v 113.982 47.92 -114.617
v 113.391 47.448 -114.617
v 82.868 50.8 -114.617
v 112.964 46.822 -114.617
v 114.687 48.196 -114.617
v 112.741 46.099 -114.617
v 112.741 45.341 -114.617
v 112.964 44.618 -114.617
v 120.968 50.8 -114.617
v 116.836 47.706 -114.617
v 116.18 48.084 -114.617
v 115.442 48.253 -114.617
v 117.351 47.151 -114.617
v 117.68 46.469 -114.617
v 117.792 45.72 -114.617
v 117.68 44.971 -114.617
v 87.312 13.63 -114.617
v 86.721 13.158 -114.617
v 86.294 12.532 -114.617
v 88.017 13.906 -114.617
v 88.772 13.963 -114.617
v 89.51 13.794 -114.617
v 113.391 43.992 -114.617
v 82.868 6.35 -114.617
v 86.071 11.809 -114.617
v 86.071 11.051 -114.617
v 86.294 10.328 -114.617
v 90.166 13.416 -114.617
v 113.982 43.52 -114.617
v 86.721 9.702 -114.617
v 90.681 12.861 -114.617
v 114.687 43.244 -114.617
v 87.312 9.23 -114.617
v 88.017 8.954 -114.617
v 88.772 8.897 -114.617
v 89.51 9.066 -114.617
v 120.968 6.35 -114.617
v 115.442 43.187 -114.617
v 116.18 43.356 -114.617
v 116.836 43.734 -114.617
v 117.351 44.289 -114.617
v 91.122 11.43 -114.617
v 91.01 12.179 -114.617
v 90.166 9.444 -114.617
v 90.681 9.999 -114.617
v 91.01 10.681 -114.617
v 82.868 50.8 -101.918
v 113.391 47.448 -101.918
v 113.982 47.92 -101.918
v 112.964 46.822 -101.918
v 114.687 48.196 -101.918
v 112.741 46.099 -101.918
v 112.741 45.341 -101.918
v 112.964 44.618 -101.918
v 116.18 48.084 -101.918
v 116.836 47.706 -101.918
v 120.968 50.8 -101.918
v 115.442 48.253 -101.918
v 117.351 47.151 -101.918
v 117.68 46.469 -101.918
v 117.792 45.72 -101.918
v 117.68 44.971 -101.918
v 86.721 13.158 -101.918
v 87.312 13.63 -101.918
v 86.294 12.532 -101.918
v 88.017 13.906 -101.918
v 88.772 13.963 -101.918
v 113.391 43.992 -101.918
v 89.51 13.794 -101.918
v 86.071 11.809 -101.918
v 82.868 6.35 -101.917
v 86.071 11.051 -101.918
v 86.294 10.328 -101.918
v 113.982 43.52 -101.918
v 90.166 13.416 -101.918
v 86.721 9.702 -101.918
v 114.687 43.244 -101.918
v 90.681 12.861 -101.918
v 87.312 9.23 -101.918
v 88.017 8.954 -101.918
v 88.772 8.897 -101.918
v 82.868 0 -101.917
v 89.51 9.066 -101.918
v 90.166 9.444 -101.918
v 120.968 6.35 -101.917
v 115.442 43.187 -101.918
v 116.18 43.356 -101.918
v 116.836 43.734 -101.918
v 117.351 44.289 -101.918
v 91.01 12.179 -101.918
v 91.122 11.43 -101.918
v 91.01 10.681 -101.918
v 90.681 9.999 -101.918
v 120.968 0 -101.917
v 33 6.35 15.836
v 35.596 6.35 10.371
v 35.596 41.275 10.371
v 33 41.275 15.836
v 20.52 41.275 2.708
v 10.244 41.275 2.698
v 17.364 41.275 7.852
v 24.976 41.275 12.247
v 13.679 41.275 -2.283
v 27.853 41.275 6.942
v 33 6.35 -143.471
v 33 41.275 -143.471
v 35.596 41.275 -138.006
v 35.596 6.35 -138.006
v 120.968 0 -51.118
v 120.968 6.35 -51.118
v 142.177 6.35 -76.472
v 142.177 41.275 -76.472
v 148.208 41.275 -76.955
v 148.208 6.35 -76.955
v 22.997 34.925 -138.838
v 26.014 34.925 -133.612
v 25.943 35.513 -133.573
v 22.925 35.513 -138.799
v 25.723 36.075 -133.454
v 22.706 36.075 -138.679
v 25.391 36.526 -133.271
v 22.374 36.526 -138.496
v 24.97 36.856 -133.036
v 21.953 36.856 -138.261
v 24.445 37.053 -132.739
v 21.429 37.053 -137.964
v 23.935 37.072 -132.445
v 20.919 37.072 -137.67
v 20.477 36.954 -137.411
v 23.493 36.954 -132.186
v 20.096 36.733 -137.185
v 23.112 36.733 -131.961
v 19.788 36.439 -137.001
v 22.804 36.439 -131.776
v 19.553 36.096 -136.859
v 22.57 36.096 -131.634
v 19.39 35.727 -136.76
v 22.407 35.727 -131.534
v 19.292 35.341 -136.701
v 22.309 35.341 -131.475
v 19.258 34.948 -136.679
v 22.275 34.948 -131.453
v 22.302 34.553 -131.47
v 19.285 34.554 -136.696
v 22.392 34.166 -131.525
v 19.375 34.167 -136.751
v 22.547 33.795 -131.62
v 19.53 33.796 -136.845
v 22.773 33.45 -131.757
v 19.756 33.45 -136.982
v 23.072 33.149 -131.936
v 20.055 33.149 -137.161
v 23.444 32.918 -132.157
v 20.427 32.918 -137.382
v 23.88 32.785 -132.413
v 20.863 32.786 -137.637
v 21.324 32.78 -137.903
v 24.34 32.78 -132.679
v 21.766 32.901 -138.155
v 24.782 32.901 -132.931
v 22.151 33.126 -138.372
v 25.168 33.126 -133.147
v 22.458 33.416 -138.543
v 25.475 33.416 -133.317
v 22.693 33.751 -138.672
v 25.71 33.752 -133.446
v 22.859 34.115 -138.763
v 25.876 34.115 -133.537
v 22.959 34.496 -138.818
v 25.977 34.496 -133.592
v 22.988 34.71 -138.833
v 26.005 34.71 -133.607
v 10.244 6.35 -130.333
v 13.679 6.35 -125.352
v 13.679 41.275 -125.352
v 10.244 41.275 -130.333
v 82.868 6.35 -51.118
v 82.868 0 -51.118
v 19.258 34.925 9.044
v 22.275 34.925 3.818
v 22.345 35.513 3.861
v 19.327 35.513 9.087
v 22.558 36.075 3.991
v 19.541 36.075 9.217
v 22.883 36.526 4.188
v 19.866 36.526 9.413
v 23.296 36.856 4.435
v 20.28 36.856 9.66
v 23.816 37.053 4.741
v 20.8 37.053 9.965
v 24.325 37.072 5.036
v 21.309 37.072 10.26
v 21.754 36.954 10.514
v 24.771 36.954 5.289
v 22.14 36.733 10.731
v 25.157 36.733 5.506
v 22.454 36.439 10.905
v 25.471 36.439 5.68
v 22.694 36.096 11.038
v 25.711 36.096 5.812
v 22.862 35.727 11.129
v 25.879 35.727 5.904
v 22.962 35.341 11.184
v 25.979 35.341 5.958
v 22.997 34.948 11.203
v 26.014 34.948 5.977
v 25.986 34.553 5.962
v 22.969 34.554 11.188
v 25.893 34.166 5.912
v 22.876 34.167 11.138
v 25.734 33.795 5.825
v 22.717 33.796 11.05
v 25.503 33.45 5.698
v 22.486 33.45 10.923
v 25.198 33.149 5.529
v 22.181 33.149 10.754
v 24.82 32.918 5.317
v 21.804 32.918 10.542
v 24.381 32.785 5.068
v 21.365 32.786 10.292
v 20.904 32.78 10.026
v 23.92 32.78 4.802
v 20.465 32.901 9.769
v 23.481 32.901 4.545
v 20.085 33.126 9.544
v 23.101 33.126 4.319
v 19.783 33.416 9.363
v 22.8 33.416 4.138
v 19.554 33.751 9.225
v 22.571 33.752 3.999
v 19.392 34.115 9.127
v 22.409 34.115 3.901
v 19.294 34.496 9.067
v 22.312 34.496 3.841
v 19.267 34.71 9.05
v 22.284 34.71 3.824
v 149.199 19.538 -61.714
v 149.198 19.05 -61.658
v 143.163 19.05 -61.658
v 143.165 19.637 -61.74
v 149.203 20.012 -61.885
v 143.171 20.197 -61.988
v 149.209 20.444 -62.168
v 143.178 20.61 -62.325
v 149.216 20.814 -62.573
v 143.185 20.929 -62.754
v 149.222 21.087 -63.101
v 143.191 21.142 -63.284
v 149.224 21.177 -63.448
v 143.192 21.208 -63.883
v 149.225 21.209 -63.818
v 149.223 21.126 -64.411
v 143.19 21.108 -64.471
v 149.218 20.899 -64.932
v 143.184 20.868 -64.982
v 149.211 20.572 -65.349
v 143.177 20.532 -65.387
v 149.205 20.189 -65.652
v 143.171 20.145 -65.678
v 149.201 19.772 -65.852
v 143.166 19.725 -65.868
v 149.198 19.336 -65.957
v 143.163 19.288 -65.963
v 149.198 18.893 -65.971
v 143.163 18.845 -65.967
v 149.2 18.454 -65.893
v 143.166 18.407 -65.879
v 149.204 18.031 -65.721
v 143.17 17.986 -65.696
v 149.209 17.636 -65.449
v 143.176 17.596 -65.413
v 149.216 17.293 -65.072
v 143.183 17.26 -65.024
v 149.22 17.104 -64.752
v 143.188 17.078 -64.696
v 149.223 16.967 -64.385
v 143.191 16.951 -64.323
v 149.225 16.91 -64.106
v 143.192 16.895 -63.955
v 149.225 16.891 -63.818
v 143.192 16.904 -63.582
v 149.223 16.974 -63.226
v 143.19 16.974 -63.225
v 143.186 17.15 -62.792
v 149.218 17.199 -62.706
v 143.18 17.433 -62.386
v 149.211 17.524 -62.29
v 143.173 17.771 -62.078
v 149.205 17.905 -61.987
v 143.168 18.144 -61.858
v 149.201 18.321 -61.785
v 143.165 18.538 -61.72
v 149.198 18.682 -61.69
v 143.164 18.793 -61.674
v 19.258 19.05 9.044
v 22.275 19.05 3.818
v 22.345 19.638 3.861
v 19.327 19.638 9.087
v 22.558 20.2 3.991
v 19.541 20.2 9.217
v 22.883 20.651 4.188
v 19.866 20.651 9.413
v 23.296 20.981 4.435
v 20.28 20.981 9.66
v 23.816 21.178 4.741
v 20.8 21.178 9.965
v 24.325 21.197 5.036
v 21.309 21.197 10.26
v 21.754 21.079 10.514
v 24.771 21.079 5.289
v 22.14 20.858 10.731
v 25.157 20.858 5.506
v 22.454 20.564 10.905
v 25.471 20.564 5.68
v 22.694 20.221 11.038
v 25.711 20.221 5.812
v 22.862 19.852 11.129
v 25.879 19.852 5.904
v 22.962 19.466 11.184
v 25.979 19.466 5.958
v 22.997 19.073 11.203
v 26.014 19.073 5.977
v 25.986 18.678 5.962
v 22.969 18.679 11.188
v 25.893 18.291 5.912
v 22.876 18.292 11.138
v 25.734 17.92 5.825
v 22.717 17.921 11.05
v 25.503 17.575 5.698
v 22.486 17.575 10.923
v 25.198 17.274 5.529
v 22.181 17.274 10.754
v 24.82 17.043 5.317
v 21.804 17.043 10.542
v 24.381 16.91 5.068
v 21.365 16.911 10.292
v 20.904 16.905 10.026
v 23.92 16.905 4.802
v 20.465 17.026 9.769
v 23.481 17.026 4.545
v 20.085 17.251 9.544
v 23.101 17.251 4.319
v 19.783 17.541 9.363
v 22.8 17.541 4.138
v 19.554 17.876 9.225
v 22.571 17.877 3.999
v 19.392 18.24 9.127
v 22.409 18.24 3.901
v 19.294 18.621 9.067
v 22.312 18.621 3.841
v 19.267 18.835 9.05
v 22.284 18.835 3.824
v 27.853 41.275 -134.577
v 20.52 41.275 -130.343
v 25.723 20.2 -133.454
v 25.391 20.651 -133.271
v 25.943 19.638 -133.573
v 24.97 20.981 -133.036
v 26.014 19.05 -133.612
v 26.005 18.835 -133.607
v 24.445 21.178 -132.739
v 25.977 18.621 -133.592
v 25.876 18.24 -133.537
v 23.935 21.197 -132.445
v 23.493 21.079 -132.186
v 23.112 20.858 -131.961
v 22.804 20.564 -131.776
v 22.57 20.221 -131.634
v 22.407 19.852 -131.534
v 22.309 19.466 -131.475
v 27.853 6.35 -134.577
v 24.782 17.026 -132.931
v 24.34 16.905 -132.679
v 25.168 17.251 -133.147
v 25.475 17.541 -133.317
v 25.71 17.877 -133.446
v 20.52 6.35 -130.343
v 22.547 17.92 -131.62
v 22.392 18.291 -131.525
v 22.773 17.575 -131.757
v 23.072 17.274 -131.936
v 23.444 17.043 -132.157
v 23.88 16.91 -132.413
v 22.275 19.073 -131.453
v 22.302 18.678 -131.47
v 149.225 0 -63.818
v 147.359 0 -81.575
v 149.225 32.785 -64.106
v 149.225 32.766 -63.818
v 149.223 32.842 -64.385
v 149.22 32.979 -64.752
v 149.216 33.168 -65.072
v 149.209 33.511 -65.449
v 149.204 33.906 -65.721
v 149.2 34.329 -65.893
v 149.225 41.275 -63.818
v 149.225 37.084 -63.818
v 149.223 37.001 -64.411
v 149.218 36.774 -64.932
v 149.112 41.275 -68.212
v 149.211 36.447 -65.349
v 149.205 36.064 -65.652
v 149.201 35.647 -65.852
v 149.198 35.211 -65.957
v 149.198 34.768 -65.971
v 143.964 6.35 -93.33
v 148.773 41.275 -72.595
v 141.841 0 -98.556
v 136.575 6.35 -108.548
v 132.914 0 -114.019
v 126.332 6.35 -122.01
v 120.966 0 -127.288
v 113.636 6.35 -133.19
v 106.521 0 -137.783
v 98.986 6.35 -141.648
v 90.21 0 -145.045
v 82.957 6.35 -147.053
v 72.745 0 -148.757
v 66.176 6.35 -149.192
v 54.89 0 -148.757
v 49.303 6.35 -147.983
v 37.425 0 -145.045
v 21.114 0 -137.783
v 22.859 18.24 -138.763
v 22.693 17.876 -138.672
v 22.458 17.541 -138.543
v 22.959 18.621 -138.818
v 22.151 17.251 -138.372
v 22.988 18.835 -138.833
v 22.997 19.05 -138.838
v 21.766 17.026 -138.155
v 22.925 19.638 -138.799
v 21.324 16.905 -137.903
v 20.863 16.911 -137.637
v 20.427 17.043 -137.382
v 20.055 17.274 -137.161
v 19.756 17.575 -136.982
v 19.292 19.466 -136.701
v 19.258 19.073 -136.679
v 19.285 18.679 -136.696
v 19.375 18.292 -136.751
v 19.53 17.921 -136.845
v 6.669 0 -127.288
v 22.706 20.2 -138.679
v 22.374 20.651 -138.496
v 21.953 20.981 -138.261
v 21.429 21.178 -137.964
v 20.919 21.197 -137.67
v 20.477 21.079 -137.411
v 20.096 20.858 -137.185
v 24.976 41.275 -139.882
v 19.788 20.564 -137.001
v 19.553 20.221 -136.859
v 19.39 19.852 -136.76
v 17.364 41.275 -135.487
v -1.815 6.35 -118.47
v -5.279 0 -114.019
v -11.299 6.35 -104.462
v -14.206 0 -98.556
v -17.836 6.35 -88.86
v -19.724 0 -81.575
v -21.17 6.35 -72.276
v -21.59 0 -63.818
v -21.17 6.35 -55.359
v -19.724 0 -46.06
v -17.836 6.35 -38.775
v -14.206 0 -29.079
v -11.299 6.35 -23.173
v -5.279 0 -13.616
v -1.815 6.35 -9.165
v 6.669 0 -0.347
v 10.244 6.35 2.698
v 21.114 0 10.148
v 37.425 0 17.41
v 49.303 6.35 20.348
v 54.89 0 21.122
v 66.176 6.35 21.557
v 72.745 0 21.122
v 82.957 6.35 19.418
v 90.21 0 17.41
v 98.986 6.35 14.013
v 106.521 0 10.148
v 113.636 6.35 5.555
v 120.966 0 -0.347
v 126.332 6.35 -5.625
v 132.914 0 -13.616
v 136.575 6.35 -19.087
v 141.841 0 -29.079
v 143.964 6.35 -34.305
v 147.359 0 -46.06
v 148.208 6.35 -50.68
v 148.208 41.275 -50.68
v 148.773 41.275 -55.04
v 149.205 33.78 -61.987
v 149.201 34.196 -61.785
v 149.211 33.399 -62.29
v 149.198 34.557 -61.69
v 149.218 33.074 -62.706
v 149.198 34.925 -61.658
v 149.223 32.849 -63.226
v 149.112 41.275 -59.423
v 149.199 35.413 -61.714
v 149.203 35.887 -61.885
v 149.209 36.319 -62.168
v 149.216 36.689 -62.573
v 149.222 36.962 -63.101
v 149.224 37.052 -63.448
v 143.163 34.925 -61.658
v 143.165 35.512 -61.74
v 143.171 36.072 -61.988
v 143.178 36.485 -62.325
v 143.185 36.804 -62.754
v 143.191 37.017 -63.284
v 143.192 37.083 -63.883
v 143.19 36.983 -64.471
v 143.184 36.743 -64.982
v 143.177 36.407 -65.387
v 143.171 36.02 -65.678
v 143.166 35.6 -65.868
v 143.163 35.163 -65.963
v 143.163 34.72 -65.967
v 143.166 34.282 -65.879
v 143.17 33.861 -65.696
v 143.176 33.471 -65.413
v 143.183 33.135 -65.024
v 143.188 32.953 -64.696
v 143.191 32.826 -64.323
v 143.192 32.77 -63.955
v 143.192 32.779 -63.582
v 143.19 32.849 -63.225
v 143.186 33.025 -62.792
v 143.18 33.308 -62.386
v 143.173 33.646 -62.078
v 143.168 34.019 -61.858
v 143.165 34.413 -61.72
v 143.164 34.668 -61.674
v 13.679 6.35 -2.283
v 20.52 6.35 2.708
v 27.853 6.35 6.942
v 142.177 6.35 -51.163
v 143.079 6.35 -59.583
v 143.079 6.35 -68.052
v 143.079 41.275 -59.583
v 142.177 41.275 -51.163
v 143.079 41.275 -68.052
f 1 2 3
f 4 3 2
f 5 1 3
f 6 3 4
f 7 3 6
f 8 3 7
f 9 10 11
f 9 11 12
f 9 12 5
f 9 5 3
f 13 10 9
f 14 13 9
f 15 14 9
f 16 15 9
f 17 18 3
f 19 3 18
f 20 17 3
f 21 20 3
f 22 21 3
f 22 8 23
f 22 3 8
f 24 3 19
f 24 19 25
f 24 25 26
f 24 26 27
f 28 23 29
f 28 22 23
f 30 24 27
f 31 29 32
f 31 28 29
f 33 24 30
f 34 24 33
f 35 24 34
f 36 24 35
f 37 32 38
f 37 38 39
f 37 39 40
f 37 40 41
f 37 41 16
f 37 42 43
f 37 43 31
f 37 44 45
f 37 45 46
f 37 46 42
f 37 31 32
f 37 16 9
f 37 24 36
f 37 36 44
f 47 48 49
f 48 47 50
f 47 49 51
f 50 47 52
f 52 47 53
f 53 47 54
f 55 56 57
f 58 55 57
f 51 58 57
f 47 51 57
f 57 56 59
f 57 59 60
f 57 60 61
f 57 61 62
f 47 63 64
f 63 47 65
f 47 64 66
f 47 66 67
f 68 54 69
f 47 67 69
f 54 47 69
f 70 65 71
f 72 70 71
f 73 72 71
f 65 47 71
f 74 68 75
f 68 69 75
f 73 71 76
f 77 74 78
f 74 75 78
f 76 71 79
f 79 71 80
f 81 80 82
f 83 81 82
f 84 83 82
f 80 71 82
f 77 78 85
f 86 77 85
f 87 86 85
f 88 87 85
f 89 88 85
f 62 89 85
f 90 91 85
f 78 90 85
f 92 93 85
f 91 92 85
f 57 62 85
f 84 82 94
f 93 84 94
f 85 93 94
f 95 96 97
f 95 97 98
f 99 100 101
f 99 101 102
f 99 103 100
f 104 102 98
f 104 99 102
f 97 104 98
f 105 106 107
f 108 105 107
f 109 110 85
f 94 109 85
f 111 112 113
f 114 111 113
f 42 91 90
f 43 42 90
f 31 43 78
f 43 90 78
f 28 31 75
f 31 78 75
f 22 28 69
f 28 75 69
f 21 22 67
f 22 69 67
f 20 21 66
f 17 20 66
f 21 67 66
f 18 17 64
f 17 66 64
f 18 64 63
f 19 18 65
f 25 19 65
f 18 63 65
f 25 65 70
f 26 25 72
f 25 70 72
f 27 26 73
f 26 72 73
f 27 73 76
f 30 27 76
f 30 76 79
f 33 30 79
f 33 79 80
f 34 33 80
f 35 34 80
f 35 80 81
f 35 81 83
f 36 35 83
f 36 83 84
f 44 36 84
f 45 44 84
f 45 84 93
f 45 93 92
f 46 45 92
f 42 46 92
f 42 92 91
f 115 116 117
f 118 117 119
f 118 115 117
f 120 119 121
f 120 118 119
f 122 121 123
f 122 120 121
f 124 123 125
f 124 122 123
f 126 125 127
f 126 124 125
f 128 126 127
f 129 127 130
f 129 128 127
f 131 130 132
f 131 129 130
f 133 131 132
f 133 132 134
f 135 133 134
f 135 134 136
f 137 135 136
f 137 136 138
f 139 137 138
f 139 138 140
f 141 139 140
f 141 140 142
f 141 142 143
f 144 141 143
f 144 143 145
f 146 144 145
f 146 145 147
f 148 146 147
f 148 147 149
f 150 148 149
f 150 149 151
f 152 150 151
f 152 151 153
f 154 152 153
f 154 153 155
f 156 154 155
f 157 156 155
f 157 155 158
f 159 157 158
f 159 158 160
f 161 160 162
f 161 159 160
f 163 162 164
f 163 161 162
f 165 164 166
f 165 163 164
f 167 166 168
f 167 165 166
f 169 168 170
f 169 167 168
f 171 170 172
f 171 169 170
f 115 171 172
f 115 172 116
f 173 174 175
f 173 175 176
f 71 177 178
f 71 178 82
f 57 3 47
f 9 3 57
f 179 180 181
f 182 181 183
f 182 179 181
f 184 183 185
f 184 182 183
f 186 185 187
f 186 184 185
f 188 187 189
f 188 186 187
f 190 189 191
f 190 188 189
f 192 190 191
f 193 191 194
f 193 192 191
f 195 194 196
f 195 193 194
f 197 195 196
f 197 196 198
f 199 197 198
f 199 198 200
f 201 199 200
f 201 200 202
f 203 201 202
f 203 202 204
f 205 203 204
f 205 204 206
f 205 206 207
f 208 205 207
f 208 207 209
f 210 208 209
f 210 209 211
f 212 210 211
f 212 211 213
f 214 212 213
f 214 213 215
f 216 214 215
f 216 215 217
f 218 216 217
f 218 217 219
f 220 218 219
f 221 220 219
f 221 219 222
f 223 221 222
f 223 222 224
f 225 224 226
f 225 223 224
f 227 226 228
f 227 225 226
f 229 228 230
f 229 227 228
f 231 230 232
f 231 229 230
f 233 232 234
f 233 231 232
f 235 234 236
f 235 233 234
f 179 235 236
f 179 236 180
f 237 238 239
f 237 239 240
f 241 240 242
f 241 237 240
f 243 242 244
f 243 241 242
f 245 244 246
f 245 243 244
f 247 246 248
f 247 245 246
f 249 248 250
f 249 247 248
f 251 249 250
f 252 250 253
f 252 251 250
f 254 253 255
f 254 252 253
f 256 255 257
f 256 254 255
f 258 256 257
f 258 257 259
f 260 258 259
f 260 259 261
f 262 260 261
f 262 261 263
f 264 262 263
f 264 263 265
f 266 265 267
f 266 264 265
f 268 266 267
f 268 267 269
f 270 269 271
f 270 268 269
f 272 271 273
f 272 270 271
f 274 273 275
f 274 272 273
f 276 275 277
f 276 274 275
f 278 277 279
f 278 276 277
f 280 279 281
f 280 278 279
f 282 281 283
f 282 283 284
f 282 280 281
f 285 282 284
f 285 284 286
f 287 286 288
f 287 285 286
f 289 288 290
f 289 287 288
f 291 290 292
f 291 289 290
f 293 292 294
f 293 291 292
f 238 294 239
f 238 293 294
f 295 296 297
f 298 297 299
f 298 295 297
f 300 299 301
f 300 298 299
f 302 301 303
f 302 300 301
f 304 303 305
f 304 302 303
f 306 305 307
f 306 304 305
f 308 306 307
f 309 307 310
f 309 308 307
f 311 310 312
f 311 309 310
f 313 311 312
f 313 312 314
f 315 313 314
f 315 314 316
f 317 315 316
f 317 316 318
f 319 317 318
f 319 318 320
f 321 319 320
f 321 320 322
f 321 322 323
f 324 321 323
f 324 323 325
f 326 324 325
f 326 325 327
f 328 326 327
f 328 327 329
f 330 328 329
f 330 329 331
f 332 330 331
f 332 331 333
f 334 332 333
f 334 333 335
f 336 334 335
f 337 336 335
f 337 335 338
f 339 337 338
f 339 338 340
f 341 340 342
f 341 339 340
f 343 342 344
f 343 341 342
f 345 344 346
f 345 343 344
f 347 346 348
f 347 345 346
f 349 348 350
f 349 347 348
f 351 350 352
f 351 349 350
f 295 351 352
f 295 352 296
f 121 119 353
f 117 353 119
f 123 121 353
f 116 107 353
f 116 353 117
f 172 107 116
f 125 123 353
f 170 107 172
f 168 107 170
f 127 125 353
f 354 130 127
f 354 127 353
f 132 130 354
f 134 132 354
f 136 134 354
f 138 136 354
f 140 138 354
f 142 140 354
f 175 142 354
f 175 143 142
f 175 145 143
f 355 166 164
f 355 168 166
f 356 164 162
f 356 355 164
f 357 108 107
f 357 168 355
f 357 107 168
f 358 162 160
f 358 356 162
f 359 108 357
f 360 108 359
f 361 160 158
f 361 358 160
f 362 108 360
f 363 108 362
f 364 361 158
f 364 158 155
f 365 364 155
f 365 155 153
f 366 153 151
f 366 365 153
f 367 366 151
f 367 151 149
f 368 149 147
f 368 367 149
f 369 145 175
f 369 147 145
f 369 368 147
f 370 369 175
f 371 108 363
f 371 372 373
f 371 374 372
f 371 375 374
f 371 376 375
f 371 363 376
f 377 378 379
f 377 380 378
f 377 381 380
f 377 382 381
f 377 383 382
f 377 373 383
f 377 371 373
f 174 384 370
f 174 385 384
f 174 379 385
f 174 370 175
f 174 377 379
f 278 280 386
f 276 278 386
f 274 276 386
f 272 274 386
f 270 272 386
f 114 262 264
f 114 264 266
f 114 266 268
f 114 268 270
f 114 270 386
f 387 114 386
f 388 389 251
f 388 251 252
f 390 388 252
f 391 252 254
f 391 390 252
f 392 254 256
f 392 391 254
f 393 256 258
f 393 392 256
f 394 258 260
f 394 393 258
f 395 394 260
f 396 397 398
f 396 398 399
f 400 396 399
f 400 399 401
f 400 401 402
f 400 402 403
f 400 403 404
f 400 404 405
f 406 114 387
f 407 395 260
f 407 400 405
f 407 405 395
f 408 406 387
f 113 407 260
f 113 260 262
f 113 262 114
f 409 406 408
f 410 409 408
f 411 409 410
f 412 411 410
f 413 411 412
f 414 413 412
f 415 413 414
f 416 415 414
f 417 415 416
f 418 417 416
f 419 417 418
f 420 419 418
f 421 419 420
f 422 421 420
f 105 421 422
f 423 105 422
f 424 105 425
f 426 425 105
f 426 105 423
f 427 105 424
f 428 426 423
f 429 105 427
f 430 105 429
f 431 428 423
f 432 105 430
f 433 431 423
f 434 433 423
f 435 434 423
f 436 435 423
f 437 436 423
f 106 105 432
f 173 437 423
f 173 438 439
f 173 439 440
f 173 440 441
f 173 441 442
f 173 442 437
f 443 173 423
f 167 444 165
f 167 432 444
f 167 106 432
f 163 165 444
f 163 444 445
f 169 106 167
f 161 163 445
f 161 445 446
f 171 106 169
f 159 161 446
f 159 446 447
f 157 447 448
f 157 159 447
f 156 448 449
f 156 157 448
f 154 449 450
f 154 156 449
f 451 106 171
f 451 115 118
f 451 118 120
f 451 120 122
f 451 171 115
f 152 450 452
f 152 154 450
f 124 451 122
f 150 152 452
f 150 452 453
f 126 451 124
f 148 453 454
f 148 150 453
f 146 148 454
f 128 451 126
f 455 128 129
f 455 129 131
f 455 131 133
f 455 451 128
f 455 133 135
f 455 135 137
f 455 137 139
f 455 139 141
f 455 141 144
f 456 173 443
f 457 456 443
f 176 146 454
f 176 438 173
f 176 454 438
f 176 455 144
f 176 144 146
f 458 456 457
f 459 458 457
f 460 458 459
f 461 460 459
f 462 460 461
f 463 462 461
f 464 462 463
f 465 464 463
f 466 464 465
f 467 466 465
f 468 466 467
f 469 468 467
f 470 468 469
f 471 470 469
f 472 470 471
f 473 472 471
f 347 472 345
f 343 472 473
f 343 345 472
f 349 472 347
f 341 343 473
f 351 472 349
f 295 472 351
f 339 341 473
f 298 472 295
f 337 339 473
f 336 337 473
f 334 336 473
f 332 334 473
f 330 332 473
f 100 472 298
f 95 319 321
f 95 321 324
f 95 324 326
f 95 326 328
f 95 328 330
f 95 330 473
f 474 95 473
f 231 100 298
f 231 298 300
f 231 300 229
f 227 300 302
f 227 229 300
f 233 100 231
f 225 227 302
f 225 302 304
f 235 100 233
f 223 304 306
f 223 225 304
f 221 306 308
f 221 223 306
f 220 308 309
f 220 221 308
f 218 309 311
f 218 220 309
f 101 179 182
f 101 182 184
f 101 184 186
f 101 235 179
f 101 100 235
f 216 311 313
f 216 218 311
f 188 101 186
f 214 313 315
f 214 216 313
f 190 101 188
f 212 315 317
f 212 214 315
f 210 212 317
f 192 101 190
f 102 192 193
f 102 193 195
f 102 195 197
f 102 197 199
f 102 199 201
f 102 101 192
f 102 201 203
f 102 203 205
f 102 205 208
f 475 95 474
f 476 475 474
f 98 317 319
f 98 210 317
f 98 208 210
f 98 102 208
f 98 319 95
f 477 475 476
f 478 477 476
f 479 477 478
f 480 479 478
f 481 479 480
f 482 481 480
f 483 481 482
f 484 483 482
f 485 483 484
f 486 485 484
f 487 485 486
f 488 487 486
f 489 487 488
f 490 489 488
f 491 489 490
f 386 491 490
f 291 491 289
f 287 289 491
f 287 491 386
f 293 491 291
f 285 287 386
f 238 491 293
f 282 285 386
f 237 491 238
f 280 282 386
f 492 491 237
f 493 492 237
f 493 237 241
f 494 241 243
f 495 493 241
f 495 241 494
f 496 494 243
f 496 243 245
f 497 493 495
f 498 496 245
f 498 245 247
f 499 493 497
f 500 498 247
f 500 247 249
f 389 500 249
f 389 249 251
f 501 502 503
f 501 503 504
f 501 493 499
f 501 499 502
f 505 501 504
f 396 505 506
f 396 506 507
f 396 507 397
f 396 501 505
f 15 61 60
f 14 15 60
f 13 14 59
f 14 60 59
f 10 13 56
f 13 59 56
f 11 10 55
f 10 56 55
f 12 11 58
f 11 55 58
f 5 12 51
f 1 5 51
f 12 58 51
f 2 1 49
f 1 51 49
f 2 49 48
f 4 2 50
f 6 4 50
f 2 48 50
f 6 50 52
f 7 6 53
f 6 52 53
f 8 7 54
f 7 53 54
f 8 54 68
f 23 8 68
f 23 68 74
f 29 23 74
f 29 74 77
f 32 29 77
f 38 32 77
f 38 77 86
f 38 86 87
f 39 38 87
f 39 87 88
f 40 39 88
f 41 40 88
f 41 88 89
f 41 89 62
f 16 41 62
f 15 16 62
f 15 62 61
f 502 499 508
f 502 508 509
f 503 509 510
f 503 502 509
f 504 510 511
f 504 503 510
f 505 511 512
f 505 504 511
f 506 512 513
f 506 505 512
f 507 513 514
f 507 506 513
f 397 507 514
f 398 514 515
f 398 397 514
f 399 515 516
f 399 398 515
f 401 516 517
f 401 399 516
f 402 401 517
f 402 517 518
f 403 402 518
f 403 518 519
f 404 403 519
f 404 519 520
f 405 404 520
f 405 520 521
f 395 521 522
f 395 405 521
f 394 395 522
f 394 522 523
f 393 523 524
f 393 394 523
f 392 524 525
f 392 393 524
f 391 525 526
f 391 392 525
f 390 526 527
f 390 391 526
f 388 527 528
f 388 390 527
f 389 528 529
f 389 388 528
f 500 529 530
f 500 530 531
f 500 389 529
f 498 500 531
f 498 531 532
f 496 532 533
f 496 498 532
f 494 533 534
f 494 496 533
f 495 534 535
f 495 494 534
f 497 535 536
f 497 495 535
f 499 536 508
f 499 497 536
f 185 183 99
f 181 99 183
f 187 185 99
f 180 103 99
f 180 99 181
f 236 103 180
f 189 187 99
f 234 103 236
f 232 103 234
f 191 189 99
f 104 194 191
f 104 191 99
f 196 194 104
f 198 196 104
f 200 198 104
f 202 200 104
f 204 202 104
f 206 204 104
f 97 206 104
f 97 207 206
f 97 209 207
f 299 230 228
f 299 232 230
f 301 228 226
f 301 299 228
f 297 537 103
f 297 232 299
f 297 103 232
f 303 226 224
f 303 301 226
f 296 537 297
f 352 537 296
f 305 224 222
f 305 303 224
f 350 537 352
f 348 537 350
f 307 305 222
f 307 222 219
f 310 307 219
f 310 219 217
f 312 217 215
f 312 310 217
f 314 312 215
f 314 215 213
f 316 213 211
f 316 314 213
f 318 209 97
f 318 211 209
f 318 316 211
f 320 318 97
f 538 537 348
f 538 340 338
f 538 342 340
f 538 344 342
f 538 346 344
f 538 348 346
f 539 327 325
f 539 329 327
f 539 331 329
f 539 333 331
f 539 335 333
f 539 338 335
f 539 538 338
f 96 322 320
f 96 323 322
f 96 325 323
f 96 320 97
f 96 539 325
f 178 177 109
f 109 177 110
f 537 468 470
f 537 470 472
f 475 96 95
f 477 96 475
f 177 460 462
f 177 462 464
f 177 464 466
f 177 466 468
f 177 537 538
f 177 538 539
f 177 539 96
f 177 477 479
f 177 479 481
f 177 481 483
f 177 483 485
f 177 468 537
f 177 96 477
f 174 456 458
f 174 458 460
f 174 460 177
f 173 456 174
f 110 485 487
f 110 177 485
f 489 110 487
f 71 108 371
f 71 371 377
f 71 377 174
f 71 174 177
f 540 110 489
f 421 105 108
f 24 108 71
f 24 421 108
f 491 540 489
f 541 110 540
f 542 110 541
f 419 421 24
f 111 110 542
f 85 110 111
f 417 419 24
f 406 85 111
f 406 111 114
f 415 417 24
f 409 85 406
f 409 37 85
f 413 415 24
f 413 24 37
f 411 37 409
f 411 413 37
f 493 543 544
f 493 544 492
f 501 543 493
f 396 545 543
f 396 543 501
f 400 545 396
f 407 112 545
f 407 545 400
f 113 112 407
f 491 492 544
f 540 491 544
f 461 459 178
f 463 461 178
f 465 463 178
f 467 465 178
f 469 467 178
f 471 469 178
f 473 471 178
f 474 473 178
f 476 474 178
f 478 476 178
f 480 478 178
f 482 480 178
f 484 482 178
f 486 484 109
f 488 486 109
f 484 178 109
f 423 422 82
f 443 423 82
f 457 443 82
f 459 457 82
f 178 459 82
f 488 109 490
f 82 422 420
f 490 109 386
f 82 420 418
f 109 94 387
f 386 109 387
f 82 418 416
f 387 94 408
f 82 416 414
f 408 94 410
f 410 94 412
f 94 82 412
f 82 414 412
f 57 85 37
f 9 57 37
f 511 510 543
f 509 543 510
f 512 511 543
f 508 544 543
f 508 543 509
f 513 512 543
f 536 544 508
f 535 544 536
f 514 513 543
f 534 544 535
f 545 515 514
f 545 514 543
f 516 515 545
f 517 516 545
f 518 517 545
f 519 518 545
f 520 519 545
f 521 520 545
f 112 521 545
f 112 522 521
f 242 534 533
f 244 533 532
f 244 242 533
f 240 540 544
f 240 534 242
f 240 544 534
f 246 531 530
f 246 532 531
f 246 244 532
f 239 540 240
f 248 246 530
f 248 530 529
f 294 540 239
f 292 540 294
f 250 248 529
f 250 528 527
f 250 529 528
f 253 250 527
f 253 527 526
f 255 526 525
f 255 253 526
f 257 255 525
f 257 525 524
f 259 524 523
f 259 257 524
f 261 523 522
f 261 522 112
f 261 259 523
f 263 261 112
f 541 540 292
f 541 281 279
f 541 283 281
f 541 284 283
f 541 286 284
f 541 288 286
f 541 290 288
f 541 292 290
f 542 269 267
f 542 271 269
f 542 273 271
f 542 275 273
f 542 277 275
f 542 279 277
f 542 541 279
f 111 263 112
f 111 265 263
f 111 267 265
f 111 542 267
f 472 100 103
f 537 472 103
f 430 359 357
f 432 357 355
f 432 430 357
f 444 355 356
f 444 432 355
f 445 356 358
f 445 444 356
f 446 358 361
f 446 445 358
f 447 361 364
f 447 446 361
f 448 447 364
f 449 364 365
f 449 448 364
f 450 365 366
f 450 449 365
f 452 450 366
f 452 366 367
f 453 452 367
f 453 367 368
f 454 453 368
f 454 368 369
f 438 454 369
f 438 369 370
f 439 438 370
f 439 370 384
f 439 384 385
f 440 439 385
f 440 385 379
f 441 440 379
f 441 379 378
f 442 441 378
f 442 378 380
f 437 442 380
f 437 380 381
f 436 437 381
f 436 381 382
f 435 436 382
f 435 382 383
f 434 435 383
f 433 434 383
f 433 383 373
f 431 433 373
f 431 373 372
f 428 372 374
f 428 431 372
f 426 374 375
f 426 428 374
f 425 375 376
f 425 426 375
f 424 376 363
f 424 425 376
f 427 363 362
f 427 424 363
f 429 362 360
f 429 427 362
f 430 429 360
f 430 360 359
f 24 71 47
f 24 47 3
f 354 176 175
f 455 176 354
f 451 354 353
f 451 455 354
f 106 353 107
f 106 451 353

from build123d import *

# Parameters (mm, degrees)
SKETCH1_W           = 127.635
SKETCH1_H           = 127.635
MAIN_PLATE_DEPTH    = 6.35
SKETCH9_R           = 85.725
BOSS_EXTRUDE1_DEPTH = 6.35
SKETCH10_R          = 95.25
SKETCH10_R_2        = 85.4075
CUT_EXTRUDE1_DEPTH  = 167.64
SKETCH18_R          = 85.4075
SKETCH18_R_2        = 79.375
BOSS_EXTRUDE2_DEPTH = 38.1
SKETCH15_R          = 2.159
CUT_EXTRUDE3_DEPTH  = 88.9
CIRPATTERN1_COUNT   = 3
SKETCH23_R          = 79.375
CUT_EXTRUDE6_DEPTH  = 111.600000066
SKETCH24_W          = 38.1
SKETCH24_H          = 50.8
CUT_EXTRUDE7_DEPTH  = 7.35
SKETCH25_W          = 38.1
SKETCH25_H          = 12.7
BOSS_EXTRUDE3_DEPTH = 44.45
SKETCH26_R          = 2.54
CUT_EXTRUDE8_DEPTH  = 44.45


with BuildPart() as part:
    # Sketch1 → Main Plate (new body)
    with BuildSketch(Plane(origin=(0, 0, 0), x_dir=(1, 0, 0), z_dir=(0, 1, 0))):
        with Locations((63.8175, 63.8175)):
            Rectangle(SKETCH1_W, SKETCH1_H)
    extrude(amount=MAIN_PLATE_DEPTH)

    # Sketch9 → Boss-Extrude1 (add)
    with BuildSketch(Plane(origin=(0, 6.35, 0), x_dir=(1, 0, 0), z_dir=(0, 1, 0))):
        with Locations((63.8175, 63.8175)):
            Circle(SKETCH9_R)
    extrude(amount=-BOSS_EXTRUDE1_DEPTH)

    # Sketch10 → Cut-Extrude1 (cut)
    with BuildSketch(Plane(origin=(0, 6.35, 0), x_dir=(1, 0, 0), z_dir=(0, 1, 0))):
        with Locations((63.8175, 63.8175)):
            Circle(SKETCH10_R)
        with Locations((63.8175, 63.8175)):
            Circle(SKETCH10_R_2, mode=Mode.SUBTRACT)
    extrude(amount=-CUT_EXTRUDE1_DEPTH, mode=Mode.SUBTRACT)

    # Sketch18 → Boss-Extrude2 (add)
    with BuildSketch(Plane(origin=(0, 3.175, 0), x_dir=(1, 0, 0), z_dir=(0, 1, 0))):
        with Locations((63.8175, 63.8175)):
            Circle(SKETCH18_R)
        with Locations((63.8175, 63.8175)):
            Circle(SKETCH18_R_2, mode=Mode.SUBTRACT)
    extrude(amount=BOSS_EXTRUDE2_DEPTH)

    # Sketch15 → Cut-Extrude3 (cut)
    with BuildSketch(Plane(origin=(166.221610148, -6.35, 178.614251028), x_dir=(-0.866025404, 0, -0.5), z_dir=(0.5, 0, -0.866025404))):
        with Locations((209.900436354, 25.4)):
            Circle(SKETCH15_R)
        with Locations((209.900436354, 41.275)):
            Circle(SKETCH15_R)
    cut_extrude3 = extrude(amount=CUT_EXTRUDE3_DEPTH, mode=Mode.SUBTRACT)

    # CirPattern1: Cut-Extrude3 ×3 about axis
    cirpattern1_axis = Axis((63.8175, -161.29, -63.8175), (0, 1, 0))
    for i in range(1, CIRPATTERN1_COUNT):
        add(cut_extrude3.rotate(cirpattern1_axis, i * 360 / CIRPATTERN1_COUNT), mode=Mode.SUBTRACT)

    # Sketch23 → Cut-Extrude6 (cut)
    with BuildSketch(Plane(origin=(0, 6.35, 0), x_dir=(1, 0, 0), z_dir=(0, 1, 0))):
        with Locations((63.8175, 63.8175)):
            Circle(SKETCH23_R)
        with BuildLine():
            Line((13.678739997, 125.352005526), (7.552270878, 134.237860218))
            Line((7.552270878, 134.237860218), (-19.267108419, 125.320629884))
            Line((-19.267108419, 125.320629884), (-48.79695837, 60.397770071))
            Line((-48.79695837, 60.397770071), (-9.884344094, 7.052469015))
            Line((-9.884344094, 7.052469015), (6.959175986, -7.46308736))
            Line((6.959175986, -7.46308736), (13.678739997, 2.282994474))
            ThreePointArc((13.678739997, 2.282994474), (-15.5575, 63.8175), (13.678739997, 125.352005526))
        make_face()
        with BuildLine():
            Line((142.177324996, 76.471687114), (152.935935453, 77.334437661))
            Line((152.935935453, 77.334437661), (158.623077101, 105.019316613))
            Line((158.623077101, 105.019316613), (117.163156193, 163.054346747))
            Line((117.163156193, 163.054346747), (51.508463168, 156.027684783))
            Line((51.508463168, 156.027684783), (30.515862556, 148.698546693))
            Line((30.515862556, 148.698546693), (35.596435007, 138.00619264))
            ThreePointArc((35.596435007, 138.00619264), (103.505, 132.558266425), (142.177324996, 76.471687114))
        make_face()
        with BuildLine():
            Line((35.596435007, -10.37119264), (30.964293669, -20.119797879))
            Line((30.964293669, -20.119797879), (52.096531318, -38.887446496))
            Line((52.096531318, -38.887446496), (123.086302178, -31.999616818))
            Line((123.086302178, -31.999616818), (149.828380926, 28.372346201))
            Line((149.828380926, 28.372346201), (153.977461458, 50.217040667))
            Line((153.977461458, 50.217040667), (142.177324996, 51.163312886))
            ThreePointArc((142.177324996, 51.163312886), (103.505, -4.923266425), (35.596435007, -10.37119264))
        make_face()
    extrude(amount=CUT_EXTRUDE6_DEPTH, mode=Mode.SUBTRACT)

    # Sketch24 → Cut-Extrude7 (cut, through all)
    with BuildSketch(Plane(origin=(0, 6.35, 0), x_dir=(1, 0, 0), z_dir=(0, 1, 0))):
        with Locations((101.9175, 76.5175)):
            Rectangle(SKETCH24_W, SKETCH24_H)
    extrude(amount=-CUT_EXTRUDE7_DEPTH, mode=Mode.SUBTRACT)

    # Sketch25 → Boss-Extrude3 (add)
    with BuildSketch(Plane(origin=(0, 6.35, 0), x_dir=(1, 0, 0), z_dir=(0, 1, 0))):
        with Locations((101.9175, 108.2675)):
            Rectangle(SKETCH25_W, SKETCH25_H)
    extrude(amount=BOSS_EXTRUDE3_DEPTH)

    # Sketch26 → Cut-Extrude8 (cut)
    with BuildSketch(Plane.XY.offset(-101.9175)):
        with Locations((115.2525, 45.72)):
            Circle(SKETCH26_R)
        with Locations((88.5825, 11.43)):
            Circle(SKETCH26_R)
    extrude(amount=-CUT_EXTRUDE8_DEPTH, mode=Mode.SUBTRACT)


solid = part.part
